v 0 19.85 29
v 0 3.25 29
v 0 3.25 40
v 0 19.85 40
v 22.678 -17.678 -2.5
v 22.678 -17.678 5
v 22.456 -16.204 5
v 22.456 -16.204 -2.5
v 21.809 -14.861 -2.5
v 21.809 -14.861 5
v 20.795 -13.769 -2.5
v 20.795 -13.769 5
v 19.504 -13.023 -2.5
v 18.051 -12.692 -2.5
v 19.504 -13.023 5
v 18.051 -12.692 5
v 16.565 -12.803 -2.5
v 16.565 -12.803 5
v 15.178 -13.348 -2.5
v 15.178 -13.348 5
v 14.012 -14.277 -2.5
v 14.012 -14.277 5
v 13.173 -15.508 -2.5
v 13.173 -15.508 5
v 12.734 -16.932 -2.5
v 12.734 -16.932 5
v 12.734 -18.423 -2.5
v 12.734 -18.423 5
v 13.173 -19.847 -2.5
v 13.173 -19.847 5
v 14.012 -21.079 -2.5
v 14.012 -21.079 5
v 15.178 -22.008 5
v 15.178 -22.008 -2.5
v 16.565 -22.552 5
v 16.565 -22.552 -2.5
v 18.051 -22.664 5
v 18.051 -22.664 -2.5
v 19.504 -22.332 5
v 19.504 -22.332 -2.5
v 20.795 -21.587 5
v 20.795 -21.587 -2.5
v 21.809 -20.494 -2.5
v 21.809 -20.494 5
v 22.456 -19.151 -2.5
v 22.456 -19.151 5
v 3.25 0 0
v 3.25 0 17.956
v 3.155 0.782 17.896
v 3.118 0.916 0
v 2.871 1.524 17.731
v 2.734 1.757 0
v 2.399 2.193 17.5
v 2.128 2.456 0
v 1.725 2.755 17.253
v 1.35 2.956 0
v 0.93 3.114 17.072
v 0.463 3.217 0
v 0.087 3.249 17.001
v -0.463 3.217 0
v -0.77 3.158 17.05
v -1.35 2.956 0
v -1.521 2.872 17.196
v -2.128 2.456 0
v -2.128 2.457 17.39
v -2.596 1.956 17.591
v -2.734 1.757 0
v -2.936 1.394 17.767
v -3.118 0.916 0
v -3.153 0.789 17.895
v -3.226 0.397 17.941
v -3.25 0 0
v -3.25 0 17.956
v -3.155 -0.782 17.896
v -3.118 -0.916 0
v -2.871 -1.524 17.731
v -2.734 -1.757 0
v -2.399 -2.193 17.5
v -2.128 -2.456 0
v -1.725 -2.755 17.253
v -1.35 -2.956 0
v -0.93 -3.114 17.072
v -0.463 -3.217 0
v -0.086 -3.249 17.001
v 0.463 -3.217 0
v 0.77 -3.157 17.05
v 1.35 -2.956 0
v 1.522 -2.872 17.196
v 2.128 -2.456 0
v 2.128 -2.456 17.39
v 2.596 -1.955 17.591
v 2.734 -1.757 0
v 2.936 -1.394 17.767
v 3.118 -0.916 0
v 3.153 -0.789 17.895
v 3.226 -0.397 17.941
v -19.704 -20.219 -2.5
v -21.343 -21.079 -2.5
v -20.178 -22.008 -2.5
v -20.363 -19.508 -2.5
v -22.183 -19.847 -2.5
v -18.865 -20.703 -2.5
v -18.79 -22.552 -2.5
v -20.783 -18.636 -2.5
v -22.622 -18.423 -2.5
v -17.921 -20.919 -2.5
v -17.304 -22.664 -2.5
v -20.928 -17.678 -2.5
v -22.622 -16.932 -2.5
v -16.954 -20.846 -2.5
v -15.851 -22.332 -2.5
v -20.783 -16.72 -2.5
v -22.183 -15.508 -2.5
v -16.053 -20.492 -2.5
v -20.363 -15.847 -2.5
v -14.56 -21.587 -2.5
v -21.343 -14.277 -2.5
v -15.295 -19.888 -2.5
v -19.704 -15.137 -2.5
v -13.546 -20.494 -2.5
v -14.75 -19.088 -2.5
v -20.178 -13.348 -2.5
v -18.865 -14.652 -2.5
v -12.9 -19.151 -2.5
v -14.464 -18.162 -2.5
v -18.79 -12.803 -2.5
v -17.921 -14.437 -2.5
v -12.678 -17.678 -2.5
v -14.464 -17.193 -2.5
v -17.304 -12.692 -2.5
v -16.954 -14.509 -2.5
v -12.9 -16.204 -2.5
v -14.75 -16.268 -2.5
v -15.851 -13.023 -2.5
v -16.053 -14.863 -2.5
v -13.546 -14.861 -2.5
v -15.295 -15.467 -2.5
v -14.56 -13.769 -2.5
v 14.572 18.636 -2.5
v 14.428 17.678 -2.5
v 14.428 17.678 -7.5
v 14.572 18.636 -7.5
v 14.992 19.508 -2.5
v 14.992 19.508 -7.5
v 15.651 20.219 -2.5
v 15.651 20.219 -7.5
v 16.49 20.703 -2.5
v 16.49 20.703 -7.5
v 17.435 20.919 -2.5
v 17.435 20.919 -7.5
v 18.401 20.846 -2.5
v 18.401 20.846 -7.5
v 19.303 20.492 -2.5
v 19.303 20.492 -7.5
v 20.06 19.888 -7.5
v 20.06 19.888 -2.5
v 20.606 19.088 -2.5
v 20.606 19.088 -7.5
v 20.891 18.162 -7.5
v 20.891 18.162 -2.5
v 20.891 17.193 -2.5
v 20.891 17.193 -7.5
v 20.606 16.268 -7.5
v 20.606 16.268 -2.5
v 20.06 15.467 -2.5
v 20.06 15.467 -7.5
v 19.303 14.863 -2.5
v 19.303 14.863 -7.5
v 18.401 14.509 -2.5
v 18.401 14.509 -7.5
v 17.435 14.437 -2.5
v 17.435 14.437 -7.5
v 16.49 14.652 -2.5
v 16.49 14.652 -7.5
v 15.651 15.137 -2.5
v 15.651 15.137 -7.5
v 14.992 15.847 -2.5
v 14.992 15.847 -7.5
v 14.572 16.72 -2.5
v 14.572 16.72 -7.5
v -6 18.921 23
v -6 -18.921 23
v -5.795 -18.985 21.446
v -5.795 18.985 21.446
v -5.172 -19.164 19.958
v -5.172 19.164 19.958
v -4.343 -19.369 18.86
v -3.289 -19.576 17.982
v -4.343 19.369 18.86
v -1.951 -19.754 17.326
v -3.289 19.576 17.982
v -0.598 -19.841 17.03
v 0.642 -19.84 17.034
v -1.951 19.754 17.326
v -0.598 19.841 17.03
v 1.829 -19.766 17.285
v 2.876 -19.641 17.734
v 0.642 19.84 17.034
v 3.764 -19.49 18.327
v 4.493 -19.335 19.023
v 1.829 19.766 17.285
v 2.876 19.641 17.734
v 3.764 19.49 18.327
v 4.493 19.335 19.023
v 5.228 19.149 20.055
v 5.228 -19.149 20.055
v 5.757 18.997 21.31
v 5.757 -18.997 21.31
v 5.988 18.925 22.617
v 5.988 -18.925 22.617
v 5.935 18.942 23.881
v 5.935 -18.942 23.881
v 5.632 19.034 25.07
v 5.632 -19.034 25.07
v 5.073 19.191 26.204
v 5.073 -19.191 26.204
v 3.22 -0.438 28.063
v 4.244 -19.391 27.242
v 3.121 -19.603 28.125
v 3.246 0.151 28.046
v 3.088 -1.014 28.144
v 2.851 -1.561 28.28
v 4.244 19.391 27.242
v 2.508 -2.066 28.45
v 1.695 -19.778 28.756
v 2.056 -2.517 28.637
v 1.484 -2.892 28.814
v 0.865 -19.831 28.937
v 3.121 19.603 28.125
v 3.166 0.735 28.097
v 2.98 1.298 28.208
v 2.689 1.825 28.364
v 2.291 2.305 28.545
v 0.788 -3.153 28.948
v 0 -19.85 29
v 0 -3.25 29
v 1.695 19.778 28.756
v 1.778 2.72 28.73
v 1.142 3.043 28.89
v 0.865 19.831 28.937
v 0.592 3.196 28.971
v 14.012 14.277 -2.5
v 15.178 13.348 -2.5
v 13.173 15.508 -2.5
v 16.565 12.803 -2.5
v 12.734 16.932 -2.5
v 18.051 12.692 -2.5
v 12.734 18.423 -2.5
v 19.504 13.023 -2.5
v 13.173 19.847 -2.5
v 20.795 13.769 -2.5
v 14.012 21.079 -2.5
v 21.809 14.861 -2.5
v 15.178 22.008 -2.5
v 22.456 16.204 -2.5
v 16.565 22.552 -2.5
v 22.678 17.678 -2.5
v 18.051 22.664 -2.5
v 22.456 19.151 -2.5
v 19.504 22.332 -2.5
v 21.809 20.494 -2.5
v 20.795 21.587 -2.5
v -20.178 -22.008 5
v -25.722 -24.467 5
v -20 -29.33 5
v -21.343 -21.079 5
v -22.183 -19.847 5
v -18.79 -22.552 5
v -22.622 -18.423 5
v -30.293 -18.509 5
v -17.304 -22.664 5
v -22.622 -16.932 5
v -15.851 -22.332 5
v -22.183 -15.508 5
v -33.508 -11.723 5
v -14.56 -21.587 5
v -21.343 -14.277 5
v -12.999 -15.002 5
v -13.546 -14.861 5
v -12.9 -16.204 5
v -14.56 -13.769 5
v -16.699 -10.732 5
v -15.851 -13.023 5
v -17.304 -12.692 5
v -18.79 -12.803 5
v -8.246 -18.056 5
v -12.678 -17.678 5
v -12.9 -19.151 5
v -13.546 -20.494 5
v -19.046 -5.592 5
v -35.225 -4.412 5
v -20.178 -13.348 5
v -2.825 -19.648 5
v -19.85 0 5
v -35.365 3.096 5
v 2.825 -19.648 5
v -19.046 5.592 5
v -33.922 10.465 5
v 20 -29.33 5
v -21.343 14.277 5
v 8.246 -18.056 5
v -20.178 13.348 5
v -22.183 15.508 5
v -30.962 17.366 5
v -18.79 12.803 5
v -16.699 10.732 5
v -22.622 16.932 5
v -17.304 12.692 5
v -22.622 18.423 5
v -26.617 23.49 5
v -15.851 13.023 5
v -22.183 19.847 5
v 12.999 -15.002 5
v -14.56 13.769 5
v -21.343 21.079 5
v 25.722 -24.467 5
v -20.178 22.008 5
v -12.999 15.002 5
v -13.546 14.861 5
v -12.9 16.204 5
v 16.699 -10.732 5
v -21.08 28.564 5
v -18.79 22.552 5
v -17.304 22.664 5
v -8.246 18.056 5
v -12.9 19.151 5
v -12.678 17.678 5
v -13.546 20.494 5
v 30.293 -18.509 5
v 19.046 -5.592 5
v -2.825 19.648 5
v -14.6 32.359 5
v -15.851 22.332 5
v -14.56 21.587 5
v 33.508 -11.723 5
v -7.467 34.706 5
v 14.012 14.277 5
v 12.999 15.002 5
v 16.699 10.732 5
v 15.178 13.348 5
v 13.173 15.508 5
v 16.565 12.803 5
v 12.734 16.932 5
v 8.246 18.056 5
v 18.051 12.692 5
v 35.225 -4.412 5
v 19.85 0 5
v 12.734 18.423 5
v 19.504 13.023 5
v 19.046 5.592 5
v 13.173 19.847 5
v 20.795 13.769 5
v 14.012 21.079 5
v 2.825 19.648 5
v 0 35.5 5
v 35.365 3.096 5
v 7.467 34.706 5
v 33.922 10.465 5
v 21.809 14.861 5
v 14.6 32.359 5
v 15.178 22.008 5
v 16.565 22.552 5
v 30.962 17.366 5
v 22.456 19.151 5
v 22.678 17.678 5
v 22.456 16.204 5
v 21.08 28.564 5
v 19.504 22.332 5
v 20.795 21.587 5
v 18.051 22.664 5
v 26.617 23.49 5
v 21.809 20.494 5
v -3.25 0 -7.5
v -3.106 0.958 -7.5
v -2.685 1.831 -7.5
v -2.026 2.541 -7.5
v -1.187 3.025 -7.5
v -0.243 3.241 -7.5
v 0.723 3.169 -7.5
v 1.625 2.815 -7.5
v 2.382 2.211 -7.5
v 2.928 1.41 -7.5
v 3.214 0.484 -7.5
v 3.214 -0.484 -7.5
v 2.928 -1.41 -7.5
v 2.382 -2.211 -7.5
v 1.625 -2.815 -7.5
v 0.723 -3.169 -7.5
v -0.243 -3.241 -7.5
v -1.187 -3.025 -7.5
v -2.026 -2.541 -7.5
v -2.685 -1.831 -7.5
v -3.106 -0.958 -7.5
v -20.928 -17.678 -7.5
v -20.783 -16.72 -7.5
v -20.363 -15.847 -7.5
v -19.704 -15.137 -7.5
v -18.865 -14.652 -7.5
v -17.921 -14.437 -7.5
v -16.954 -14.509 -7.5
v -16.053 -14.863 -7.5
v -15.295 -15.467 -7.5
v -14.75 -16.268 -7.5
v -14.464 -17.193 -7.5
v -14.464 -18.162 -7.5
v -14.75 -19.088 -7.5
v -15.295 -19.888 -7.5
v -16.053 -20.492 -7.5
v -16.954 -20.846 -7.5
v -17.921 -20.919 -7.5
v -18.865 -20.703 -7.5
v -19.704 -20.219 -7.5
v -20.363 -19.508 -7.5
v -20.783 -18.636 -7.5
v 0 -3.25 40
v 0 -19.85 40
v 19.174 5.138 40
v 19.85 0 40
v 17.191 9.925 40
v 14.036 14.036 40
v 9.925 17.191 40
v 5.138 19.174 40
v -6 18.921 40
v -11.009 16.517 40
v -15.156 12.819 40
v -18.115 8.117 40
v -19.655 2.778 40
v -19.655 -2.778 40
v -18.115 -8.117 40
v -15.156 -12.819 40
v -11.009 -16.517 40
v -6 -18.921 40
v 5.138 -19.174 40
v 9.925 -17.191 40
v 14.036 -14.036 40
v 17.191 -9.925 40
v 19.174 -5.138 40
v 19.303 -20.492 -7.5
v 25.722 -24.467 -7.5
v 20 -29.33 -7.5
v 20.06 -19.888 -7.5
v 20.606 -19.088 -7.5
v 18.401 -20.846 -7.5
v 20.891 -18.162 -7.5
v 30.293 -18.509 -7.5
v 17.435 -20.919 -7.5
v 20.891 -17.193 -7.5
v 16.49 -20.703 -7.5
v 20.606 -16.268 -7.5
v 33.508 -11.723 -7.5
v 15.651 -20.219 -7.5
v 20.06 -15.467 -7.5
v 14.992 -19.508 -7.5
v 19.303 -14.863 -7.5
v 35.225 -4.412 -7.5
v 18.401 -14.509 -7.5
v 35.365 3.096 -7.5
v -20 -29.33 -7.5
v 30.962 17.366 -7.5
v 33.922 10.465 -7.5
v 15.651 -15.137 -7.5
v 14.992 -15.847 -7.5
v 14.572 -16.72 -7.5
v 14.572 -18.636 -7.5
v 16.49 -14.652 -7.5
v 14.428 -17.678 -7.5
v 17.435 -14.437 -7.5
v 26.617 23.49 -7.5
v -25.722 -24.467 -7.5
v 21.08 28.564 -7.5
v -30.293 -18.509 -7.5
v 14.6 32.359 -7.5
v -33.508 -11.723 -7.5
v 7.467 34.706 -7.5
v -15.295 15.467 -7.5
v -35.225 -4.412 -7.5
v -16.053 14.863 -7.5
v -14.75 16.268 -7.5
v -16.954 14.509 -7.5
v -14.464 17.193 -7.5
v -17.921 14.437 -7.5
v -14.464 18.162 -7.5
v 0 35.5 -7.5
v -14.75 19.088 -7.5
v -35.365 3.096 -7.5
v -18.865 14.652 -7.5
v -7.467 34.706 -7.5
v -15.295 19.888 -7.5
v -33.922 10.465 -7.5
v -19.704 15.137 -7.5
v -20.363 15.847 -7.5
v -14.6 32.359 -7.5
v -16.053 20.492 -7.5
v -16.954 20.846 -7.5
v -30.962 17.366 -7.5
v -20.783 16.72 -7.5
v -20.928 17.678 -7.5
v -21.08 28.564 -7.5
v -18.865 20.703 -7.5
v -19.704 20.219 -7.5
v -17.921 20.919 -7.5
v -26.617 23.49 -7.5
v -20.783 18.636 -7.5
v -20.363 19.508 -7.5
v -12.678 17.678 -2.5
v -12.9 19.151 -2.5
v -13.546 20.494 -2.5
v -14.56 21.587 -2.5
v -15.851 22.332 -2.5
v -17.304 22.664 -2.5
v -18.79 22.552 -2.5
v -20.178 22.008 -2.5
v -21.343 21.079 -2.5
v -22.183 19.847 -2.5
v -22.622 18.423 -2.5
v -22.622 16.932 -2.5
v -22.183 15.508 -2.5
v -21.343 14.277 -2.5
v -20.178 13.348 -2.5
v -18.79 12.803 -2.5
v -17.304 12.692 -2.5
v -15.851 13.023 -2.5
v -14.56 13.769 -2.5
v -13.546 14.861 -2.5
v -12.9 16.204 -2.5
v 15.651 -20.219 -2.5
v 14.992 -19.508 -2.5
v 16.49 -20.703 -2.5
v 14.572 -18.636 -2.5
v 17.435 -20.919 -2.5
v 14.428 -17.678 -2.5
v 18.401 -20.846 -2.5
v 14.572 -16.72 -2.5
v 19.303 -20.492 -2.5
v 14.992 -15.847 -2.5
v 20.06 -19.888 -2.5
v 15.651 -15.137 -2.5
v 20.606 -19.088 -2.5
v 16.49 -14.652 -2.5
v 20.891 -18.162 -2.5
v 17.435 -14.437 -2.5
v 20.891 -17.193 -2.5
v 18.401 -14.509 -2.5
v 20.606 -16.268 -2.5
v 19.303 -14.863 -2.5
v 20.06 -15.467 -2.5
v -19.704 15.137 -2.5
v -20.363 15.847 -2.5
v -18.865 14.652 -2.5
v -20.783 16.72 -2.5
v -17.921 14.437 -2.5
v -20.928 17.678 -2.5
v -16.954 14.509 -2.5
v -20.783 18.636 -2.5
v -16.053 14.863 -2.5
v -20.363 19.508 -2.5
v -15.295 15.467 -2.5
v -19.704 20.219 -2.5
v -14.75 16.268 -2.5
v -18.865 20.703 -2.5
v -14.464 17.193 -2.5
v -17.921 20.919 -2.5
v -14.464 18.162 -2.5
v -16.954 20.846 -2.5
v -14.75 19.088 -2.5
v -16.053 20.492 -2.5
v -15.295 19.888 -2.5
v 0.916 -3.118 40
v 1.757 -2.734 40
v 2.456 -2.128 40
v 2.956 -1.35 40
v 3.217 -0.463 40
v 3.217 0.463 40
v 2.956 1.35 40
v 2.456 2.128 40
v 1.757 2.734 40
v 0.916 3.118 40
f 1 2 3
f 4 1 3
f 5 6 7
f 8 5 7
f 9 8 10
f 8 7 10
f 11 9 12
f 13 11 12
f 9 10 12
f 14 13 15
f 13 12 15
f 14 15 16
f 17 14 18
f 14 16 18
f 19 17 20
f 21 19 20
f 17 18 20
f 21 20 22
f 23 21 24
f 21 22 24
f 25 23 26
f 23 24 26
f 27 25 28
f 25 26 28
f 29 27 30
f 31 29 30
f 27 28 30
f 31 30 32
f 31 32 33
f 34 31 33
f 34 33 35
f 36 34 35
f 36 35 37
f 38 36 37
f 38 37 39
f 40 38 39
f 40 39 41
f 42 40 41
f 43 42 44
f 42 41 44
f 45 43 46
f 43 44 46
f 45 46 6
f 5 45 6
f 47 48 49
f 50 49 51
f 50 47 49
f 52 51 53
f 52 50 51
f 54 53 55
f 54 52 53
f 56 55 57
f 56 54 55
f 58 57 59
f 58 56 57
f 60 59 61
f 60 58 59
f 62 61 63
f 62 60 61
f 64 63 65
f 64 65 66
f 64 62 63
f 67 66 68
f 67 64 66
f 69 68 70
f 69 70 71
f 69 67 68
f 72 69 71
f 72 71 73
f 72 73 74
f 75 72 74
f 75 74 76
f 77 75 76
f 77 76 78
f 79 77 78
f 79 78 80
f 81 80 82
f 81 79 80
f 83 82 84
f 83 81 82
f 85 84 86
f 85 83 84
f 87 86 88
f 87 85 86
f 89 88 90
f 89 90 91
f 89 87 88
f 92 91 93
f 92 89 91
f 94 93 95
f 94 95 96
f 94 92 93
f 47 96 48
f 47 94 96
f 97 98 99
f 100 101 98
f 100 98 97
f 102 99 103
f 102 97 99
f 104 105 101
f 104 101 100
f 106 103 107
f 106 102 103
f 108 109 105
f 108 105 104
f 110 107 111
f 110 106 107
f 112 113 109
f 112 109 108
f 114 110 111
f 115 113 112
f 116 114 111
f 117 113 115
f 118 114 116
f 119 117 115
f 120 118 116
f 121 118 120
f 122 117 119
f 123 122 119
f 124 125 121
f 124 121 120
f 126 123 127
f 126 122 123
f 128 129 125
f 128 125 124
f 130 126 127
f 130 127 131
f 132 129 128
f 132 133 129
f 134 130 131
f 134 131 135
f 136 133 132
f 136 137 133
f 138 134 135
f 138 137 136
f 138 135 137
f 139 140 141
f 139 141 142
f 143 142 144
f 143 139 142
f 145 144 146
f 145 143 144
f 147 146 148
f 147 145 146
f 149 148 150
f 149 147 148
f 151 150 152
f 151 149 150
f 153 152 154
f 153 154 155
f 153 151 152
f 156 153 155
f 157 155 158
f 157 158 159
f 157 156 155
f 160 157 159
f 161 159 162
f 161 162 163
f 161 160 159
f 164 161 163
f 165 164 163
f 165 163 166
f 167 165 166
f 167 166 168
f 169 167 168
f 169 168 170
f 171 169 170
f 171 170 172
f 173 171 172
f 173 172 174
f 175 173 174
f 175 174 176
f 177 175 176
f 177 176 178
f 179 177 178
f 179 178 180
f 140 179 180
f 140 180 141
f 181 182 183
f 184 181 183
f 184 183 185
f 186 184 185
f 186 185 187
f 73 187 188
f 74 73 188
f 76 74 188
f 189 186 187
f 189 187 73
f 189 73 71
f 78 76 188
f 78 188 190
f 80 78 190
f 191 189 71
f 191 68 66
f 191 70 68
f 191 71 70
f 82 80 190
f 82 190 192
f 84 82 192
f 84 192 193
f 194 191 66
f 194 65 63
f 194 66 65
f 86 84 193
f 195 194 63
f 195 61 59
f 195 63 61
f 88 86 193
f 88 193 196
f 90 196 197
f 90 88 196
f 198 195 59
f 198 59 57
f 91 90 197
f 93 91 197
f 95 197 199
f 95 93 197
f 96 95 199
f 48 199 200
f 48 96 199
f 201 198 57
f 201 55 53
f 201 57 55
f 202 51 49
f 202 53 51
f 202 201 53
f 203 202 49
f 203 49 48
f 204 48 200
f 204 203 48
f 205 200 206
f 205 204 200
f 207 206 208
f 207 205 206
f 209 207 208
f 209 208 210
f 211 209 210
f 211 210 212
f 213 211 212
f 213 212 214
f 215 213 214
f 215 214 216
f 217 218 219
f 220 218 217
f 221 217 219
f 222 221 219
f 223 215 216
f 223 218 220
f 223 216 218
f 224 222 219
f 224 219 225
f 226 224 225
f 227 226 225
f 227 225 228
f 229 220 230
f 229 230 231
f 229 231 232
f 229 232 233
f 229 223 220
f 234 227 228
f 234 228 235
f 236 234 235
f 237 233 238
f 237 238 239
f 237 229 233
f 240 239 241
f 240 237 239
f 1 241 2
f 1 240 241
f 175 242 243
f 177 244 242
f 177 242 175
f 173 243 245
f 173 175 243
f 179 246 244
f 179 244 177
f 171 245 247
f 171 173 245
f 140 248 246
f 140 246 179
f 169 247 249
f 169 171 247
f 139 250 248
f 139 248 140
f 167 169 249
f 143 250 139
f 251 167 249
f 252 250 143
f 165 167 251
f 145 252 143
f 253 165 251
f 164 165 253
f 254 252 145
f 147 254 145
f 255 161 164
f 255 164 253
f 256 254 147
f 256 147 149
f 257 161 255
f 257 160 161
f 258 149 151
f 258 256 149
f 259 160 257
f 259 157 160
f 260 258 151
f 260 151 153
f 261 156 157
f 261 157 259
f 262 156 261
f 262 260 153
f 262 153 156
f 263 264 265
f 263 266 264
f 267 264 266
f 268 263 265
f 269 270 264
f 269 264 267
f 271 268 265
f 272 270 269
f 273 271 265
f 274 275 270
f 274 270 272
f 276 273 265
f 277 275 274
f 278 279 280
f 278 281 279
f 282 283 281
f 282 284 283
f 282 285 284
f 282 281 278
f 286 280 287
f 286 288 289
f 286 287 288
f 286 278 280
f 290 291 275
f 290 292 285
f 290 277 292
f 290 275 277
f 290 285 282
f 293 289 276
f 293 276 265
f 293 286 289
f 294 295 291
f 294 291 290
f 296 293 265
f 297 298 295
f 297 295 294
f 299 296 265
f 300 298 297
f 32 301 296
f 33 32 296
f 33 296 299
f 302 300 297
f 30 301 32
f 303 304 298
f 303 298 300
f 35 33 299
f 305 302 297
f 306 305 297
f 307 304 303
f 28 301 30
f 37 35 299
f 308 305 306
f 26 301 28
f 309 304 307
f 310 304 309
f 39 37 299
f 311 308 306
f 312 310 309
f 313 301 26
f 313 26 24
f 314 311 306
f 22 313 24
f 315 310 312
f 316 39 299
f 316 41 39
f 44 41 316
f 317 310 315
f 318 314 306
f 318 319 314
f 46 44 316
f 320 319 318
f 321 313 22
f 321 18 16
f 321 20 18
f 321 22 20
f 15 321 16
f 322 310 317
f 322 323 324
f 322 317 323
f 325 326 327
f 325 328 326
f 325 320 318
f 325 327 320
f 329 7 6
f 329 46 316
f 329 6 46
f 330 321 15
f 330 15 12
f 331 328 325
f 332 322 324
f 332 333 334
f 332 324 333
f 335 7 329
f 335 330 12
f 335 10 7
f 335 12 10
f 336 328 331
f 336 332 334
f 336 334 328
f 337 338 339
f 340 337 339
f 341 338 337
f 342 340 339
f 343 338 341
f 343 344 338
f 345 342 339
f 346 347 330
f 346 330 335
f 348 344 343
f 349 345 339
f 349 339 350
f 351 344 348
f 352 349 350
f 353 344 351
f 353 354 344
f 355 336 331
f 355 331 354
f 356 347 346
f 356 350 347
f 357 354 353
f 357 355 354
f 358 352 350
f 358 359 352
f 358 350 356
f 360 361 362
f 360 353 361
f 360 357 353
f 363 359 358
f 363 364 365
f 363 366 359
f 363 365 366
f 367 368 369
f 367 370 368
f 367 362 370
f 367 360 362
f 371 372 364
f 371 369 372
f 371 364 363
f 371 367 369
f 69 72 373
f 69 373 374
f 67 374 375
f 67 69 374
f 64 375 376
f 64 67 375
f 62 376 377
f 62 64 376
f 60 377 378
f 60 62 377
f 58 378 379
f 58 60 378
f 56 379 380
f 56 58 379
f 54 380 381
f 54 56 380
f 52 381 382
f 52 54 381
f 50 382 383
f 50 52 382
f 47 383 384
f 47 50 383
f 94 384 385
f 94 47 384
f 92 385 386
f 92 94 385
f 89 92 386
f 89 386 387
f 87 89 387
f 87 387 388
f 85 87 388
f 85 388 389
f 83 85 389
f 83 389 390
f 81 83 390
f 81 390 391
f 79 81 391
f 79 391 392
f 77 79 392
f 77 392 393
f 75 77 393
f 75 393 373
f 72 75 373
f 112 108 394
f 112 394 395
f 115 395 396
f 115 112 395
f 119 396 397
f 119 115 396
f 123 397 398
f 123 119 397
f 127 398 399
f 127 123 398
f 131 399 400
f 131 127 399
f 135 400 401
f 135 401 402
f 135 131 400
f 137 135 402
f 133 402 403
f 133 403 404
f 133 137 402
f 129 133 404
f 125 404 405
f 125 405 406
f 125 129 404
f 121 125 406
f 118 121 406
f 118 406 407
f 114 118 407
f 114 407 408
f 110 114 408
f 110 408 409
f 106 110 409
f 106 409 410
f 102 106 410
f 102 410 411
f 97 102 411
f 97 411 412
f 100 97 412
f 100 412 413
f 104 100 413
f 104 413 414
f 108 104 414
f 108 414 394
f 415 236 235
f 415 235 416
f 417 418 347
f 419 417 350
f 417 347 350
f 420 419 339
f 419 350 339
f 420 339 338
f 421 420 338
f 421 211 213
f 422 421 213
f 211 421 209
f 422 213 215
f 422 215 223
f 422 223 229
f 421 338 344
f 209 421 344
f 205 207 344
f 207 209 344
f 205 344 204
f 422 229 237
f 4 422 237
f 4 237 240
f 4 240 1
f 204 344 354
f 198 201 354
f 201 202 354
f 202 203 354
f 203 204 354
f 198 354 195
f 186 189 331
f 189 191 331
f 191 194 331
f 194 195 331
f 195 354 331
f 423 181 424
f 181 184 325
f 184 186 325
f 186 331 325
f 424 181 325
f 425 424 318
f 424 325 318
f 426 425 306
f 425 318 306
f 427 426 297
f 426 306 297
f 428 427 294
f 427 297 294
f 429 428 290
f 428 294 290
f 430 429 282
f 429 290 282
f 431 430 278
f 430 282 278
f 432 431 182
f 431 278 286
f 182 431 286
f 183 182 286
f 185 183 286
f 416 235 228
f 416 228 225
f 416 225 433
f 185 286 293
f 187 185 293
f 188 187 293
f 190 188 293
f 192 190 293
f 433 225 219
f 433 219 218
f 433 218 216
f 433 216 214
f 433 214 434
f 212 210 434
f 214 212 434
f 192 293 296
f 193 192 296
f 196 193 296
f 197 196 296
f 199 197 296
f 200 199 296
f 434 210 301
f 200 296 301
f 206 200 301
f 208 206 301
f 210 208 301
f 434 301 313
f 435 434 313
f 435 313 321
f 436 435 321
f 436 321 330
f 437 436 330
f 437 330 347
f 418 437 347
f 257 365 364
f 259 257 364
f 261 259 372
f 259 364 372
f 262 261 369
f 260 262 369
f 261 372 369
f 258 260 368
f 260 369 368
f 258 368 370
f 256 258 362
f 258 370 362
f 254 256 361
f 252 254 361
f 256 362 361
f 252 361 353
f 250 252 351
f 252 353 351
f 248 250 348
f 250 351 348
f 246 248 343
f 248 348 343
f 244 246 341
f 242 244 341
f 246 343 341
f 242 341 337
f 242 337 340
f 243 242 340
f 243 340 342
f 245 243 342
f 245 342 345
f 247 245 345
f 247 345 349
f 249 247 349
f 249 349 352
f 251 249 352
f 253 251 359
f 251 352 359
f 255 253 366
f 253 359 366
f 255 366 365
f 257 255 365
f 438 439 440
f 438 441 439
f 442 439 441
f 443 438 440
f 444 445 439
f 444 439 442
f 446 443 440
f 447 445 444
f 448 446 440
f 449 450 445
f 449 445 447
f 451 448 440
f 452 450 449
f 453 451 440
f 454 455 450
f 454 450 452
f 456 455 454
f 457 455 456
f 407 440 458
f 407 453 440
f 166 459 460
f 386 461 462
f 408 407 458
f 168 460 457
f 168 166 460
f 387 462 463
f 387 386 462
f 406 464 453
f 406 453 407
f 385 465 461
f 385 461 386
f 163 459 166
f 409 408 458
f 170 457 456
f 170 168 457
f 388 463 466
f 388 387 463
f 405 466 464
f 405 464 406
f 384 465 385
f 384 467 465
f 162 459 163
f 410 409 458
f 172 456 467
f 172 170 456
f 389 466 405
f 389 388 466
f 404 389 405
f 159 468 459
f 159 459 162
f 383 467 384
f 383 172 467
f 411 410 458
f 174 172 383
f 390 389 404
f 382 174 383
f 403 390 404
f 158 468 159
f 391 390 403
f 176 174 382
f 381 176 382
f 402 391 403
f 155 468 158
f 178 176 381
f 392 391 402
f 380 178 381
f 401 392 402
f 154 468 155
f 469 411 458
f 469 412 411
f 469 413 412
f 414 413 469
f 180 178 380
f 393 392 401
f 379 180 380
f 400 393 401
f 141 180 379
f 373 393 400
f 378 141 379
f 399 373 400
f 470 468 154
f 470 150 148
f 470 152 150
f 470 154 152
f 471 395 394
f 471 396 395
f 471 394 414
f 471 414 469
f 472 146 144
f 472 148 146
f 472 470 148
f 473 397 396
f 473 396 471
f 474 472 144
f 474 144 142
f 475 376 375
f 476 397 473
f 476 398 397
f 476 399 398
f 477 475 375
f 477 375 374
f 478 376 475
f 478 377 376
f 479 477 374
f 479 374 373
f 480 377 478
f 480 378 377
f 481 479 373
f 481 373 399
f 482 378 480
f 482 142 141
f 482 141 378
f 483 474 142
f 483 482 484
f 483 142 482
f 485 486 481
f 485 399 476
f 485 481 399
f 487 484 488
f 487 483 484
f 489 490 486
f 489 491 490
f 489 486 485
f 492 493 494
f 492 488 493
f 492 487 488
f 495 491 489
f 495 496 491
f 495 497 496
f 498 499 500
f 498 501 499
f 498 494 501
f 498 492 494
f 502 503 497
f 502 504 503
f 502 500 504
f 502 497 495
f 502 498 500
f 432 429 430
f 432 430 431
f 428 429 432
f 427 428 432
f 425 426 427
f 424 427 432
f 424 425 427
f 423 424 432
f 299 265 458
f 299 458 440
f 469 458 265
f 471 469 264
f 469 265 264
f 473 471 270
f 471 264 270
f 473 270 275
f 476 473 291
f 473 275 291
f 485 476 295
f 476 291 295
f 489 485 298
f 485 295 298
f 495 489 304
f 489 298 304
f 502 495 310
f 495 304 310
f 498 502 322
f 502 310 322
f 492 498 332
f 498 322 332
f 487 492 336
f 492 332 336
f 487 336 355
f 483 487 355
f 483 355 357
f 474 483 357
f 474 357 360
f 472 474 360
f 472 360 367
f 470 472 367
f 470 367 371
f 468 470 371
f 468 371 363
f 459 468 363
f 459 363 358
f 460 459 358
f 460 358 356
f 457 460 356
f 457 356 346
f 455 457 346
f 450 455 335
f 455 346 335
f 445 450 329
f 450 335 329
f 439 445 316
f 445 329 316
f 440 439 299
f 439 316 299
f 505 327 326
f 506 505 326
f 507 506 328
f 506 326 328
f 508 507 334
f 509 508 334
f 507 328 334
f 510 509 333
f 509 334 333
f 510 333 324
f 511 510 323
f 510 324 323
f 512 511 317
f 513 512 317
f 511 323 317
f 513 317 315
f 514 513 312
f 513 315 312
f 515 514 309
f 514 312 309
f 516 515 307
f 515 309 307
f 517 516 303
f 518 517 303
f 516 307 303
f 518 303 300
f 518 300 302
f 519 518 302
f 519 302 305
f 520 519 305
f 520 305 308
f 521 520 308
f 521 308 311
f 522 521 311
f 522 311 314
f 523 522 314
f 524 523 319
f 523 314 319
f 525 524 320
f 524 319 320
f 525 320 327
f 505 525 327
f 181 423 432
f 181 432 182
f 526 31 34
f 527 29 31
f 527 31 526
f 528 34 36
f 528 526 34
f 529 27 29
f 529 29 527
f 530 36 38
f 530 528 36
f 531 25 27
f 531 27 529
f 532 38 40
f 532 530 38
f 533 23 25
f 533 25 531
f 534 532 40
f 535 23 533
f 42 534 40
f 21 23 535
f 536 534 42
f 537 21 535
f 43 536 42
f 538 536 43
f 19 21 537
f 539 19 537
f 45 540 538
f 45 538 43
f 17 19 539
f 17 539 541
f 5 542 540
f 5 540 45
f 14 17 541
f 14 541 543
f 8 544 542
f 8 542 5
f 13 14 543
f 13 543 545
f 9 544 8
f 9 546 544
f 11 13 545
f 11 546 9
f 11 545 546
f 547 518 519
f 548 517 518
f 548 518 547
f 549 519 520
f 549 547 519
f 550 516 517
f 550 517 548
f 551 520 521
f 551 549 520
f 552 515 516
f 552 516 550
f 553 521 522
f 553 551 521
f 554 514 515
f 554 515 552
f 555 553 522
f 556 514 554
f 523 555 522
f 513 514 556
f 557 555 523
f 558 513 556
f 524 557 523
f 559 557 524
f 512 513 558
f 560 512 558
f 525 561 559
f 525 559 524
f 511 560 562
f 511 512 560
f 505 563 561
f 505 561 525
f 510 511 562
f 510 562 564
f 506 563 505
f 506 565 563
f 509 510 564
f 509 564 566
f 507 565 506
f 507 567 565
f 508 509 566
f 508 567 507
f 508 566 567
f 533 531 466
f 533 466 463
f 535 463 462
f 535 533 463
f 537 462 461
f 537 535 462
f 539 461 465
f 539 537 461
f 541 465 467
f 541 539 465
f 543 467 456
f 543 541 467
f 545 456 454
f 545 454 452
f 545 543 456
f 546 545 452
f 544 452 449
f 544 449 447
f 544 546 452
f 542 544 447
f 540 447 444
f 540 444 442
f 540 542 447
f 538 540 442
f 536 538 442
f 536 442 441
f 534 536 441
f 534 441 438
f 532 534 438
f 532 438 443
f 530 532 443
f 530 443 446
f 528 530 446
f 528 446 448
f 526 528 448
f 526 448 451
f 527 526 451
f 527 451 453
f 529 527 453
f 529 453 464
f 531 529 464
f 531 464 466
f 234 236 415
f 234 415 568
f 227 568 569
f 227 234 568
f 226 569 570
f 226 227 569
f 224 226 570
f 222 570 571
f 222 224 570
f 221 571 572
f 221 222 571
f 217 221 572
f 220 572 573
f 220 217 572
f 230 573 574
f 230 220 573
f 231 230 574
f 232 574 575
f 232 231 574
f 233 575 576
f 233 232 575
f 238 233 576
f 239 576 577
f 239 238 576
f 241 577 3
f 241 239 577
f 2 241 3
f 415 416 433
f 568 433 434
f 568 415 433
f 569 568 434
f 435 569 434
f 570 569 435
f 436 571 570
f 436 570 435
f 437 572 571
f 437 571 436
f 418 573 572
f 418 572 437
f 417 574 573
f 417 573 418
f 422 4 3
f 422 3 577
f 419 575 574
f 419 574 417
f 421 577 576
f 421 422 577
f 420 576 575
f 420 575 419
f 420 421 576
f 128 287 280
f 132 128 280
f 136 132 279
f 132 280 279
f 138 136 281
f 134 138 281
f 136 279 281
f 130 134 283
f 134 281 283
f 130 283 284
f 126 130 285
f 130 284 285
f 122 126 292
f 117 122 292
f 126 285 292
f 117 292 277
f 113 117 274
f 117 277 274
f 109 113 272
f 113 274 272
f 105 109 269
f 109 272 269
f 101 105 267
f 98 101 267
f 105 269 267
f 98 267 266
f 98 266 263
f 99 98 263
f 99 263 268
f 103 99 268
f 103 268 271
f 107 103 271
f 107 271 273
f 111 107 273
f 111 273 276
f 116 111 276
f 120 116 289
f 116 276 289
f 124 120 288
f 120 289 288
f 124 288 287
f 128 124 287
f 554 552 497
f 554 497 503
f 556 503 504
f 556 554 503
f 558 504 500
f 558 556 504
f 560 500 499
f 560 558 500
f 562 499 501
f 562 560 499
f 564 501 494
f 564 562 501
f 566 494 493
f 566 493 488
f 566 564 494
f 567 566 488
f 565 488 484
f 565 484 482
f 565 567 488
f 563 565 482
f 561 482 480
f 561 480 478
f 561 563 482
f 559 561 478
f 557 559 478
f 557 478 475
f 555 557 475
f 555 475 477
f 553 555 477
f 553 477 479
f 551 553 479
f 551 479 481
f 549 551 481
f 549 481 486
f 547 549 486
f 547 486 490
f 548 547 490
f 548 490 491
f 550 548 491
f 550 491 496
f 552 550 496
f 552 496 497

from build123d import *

# Parameters (mm, degrees)
CROQUIS1_R                 = 35.5
CROQUIS1_R_2               = 3.25
SALIENTE_EXTRUIR1_DEPTH    = 5
CROQUIS9_R                 = 19.85
CROQUIS9_R_2               = 3.25
SALIENTE_EXTRUIR4_DEPTH    = 35
CORTAR_EXTRUIR4_DEPTH      = 36.5
CORTAR_EXTRUIR4_DEPTH_BACK = 36.5
CROQUIS11_R                = 35.5
CROQUIS11_R_2              = 3.25
SALIENTE_EXTRUIR5_DEPTH    = 7.5
CROQUIS13_R                = 5
CORTAR_EXTRUIR5_DEPTH      = 7.5
CORTAR_EXTRUIR7_DEPTH      = 13.5


with BuildPart() as part:
    # Croquis1 → Saliente-Extruir1 (new body)
    with BuildSketch(Plane.XY):
        Circle(CROQUIS1_R)
        with Locations((17.67766953, 17.67766953)):
            Circle(CROQUIS1_R_2, mode=Mode.SUBTRACT)
        with Locations((17.67766953, -17.67766953)):
            Circle(CROQUIS1_R_2, mode=Mode.SUBTRACT)
        with Locations((-17.67766953, -17.67766953)):
            Circle(CROQUIS1_R_2, mode=Mode.SUBTRACT)
        with Locations((-17.67766953, 17.67766953)):
            Circle(CROQUIS1_R_2, mode=Mode.SUBTRACT)
        Circle(CROQUIS1_R_2, mode=Mode.SUBTRACT)
    extrude(amount=SALIENTE_EXTRUIR1_DEPTH)

    # Croquis9 → Saliente-Extruir4 (add)
    with BuildSketch(Plane.XY.offset(5)):
        Circle(CROQUIS9_R)
        Circle(CROQUIS9_R_2, mode=Mode.SUBTRACT)
    extrude(amount=SALIENTE_EXTRUIR4_DEPTH)

    # Croquis10 → Cortar-Extruir4 (cut, two sides)
    with BuildSketch(Plane(origin=(0, 0, 0), x_dir=(1, 0, 0), z_dir=(0, 1, 0))) as cortar_extruir4_sk:
        with BuildLine():
            Line((0, -29), (0, -40))
            Line((0, -40), (-6, -40))
            Line((-6, -40), (-6, -23))
            ThreePointArc((-6, -23), (4.242640687, -18.757359313), (0, -29))
        make_face()
    extrude(amount=CORTAR_EXTRUIR4_DEPTH, mode=Mode.SUBTRACT)
    extrude(cortar_extruir4_sk.sketch, amount=-CORTAR_EXTRUIR4_DEPTH_BACK, mode=Mode.SUBTRACT)

    # Croquis11 → Saliente-Extruir5 (add)
    with BuildSketch(Plane(origin=(0, 0, 0), x_dir=(-1, 0, 0), z_dir=(0, 0, -1))):
        Circle(CROQUIS11_R)
        with Locations((17.67766953, -17.67766953)):
            Circle(CROQUIS11_R_2, mode=Mode.SUBTRACT)
        Circle(CROQUIS11_R_2, mode=Mode.SUBTRACT)
        with Locations((-17.67766953, -17.67766953)):
            Circle(CROQUIS11_R_2, mode=Mode.SUBTRACT)
        with Locations((17.67766953, 17.67766953)):
            Circle(CROQUIS11_R_2, mode=Mode.SUBTRACT)
        with Locations((-17.67766953, 17.67766953)):
            Circle(CROQUIS11_R_2, mode=Mode.SUBTRACT)
    extrude(amount=SALIENTE_EXTRUIR5_DEPTH)

    # Croquis13 → Cortar-Extruir5 (cut)
    with BuildSketch(Plane.XY.offset(5)):
        with Locations((-17.67766953, 17.67766953)):
            Circle(CROQUIS13_R)
        with Locations((17.67766953, 17.67766953)):
            Circle(CROQUIS13_R)
        with Locations((17.67766953, -17.67766953)):
            Circle(CROQUIS13_R)
        with Locations((-17.67766953, -17.67766953)):
            Circle(CROQUIS13_R)
        with BuildLine():
            Line((-20, -29.330018752), (20, -29.330018752))
            ThreePointArc((20, -29.330018752), (0, -35.5), (-20, -29.330018752))
        make_face()
    extrude(amount=-CORTAR_EXTRUIR5_DEPTH, mode=Mode.SUBTRACT)

    # Croquis15 → Cortar-Extruir7 (cut, through all)
    with BuildSketch(Plane.XY.offset(5)):
        with BuildLine():
            Line((20, -29.330018752), (-20, -29.330018752))
            ThreePointArc((-20, -29.330018752), (0, -35.5), (20, -29.330018752))
        make_face()
    extrude(amount=-CORTAR_EXTRUIR7_DEPTH, mode=Mode.SUBTRACT)


solid = part.part
